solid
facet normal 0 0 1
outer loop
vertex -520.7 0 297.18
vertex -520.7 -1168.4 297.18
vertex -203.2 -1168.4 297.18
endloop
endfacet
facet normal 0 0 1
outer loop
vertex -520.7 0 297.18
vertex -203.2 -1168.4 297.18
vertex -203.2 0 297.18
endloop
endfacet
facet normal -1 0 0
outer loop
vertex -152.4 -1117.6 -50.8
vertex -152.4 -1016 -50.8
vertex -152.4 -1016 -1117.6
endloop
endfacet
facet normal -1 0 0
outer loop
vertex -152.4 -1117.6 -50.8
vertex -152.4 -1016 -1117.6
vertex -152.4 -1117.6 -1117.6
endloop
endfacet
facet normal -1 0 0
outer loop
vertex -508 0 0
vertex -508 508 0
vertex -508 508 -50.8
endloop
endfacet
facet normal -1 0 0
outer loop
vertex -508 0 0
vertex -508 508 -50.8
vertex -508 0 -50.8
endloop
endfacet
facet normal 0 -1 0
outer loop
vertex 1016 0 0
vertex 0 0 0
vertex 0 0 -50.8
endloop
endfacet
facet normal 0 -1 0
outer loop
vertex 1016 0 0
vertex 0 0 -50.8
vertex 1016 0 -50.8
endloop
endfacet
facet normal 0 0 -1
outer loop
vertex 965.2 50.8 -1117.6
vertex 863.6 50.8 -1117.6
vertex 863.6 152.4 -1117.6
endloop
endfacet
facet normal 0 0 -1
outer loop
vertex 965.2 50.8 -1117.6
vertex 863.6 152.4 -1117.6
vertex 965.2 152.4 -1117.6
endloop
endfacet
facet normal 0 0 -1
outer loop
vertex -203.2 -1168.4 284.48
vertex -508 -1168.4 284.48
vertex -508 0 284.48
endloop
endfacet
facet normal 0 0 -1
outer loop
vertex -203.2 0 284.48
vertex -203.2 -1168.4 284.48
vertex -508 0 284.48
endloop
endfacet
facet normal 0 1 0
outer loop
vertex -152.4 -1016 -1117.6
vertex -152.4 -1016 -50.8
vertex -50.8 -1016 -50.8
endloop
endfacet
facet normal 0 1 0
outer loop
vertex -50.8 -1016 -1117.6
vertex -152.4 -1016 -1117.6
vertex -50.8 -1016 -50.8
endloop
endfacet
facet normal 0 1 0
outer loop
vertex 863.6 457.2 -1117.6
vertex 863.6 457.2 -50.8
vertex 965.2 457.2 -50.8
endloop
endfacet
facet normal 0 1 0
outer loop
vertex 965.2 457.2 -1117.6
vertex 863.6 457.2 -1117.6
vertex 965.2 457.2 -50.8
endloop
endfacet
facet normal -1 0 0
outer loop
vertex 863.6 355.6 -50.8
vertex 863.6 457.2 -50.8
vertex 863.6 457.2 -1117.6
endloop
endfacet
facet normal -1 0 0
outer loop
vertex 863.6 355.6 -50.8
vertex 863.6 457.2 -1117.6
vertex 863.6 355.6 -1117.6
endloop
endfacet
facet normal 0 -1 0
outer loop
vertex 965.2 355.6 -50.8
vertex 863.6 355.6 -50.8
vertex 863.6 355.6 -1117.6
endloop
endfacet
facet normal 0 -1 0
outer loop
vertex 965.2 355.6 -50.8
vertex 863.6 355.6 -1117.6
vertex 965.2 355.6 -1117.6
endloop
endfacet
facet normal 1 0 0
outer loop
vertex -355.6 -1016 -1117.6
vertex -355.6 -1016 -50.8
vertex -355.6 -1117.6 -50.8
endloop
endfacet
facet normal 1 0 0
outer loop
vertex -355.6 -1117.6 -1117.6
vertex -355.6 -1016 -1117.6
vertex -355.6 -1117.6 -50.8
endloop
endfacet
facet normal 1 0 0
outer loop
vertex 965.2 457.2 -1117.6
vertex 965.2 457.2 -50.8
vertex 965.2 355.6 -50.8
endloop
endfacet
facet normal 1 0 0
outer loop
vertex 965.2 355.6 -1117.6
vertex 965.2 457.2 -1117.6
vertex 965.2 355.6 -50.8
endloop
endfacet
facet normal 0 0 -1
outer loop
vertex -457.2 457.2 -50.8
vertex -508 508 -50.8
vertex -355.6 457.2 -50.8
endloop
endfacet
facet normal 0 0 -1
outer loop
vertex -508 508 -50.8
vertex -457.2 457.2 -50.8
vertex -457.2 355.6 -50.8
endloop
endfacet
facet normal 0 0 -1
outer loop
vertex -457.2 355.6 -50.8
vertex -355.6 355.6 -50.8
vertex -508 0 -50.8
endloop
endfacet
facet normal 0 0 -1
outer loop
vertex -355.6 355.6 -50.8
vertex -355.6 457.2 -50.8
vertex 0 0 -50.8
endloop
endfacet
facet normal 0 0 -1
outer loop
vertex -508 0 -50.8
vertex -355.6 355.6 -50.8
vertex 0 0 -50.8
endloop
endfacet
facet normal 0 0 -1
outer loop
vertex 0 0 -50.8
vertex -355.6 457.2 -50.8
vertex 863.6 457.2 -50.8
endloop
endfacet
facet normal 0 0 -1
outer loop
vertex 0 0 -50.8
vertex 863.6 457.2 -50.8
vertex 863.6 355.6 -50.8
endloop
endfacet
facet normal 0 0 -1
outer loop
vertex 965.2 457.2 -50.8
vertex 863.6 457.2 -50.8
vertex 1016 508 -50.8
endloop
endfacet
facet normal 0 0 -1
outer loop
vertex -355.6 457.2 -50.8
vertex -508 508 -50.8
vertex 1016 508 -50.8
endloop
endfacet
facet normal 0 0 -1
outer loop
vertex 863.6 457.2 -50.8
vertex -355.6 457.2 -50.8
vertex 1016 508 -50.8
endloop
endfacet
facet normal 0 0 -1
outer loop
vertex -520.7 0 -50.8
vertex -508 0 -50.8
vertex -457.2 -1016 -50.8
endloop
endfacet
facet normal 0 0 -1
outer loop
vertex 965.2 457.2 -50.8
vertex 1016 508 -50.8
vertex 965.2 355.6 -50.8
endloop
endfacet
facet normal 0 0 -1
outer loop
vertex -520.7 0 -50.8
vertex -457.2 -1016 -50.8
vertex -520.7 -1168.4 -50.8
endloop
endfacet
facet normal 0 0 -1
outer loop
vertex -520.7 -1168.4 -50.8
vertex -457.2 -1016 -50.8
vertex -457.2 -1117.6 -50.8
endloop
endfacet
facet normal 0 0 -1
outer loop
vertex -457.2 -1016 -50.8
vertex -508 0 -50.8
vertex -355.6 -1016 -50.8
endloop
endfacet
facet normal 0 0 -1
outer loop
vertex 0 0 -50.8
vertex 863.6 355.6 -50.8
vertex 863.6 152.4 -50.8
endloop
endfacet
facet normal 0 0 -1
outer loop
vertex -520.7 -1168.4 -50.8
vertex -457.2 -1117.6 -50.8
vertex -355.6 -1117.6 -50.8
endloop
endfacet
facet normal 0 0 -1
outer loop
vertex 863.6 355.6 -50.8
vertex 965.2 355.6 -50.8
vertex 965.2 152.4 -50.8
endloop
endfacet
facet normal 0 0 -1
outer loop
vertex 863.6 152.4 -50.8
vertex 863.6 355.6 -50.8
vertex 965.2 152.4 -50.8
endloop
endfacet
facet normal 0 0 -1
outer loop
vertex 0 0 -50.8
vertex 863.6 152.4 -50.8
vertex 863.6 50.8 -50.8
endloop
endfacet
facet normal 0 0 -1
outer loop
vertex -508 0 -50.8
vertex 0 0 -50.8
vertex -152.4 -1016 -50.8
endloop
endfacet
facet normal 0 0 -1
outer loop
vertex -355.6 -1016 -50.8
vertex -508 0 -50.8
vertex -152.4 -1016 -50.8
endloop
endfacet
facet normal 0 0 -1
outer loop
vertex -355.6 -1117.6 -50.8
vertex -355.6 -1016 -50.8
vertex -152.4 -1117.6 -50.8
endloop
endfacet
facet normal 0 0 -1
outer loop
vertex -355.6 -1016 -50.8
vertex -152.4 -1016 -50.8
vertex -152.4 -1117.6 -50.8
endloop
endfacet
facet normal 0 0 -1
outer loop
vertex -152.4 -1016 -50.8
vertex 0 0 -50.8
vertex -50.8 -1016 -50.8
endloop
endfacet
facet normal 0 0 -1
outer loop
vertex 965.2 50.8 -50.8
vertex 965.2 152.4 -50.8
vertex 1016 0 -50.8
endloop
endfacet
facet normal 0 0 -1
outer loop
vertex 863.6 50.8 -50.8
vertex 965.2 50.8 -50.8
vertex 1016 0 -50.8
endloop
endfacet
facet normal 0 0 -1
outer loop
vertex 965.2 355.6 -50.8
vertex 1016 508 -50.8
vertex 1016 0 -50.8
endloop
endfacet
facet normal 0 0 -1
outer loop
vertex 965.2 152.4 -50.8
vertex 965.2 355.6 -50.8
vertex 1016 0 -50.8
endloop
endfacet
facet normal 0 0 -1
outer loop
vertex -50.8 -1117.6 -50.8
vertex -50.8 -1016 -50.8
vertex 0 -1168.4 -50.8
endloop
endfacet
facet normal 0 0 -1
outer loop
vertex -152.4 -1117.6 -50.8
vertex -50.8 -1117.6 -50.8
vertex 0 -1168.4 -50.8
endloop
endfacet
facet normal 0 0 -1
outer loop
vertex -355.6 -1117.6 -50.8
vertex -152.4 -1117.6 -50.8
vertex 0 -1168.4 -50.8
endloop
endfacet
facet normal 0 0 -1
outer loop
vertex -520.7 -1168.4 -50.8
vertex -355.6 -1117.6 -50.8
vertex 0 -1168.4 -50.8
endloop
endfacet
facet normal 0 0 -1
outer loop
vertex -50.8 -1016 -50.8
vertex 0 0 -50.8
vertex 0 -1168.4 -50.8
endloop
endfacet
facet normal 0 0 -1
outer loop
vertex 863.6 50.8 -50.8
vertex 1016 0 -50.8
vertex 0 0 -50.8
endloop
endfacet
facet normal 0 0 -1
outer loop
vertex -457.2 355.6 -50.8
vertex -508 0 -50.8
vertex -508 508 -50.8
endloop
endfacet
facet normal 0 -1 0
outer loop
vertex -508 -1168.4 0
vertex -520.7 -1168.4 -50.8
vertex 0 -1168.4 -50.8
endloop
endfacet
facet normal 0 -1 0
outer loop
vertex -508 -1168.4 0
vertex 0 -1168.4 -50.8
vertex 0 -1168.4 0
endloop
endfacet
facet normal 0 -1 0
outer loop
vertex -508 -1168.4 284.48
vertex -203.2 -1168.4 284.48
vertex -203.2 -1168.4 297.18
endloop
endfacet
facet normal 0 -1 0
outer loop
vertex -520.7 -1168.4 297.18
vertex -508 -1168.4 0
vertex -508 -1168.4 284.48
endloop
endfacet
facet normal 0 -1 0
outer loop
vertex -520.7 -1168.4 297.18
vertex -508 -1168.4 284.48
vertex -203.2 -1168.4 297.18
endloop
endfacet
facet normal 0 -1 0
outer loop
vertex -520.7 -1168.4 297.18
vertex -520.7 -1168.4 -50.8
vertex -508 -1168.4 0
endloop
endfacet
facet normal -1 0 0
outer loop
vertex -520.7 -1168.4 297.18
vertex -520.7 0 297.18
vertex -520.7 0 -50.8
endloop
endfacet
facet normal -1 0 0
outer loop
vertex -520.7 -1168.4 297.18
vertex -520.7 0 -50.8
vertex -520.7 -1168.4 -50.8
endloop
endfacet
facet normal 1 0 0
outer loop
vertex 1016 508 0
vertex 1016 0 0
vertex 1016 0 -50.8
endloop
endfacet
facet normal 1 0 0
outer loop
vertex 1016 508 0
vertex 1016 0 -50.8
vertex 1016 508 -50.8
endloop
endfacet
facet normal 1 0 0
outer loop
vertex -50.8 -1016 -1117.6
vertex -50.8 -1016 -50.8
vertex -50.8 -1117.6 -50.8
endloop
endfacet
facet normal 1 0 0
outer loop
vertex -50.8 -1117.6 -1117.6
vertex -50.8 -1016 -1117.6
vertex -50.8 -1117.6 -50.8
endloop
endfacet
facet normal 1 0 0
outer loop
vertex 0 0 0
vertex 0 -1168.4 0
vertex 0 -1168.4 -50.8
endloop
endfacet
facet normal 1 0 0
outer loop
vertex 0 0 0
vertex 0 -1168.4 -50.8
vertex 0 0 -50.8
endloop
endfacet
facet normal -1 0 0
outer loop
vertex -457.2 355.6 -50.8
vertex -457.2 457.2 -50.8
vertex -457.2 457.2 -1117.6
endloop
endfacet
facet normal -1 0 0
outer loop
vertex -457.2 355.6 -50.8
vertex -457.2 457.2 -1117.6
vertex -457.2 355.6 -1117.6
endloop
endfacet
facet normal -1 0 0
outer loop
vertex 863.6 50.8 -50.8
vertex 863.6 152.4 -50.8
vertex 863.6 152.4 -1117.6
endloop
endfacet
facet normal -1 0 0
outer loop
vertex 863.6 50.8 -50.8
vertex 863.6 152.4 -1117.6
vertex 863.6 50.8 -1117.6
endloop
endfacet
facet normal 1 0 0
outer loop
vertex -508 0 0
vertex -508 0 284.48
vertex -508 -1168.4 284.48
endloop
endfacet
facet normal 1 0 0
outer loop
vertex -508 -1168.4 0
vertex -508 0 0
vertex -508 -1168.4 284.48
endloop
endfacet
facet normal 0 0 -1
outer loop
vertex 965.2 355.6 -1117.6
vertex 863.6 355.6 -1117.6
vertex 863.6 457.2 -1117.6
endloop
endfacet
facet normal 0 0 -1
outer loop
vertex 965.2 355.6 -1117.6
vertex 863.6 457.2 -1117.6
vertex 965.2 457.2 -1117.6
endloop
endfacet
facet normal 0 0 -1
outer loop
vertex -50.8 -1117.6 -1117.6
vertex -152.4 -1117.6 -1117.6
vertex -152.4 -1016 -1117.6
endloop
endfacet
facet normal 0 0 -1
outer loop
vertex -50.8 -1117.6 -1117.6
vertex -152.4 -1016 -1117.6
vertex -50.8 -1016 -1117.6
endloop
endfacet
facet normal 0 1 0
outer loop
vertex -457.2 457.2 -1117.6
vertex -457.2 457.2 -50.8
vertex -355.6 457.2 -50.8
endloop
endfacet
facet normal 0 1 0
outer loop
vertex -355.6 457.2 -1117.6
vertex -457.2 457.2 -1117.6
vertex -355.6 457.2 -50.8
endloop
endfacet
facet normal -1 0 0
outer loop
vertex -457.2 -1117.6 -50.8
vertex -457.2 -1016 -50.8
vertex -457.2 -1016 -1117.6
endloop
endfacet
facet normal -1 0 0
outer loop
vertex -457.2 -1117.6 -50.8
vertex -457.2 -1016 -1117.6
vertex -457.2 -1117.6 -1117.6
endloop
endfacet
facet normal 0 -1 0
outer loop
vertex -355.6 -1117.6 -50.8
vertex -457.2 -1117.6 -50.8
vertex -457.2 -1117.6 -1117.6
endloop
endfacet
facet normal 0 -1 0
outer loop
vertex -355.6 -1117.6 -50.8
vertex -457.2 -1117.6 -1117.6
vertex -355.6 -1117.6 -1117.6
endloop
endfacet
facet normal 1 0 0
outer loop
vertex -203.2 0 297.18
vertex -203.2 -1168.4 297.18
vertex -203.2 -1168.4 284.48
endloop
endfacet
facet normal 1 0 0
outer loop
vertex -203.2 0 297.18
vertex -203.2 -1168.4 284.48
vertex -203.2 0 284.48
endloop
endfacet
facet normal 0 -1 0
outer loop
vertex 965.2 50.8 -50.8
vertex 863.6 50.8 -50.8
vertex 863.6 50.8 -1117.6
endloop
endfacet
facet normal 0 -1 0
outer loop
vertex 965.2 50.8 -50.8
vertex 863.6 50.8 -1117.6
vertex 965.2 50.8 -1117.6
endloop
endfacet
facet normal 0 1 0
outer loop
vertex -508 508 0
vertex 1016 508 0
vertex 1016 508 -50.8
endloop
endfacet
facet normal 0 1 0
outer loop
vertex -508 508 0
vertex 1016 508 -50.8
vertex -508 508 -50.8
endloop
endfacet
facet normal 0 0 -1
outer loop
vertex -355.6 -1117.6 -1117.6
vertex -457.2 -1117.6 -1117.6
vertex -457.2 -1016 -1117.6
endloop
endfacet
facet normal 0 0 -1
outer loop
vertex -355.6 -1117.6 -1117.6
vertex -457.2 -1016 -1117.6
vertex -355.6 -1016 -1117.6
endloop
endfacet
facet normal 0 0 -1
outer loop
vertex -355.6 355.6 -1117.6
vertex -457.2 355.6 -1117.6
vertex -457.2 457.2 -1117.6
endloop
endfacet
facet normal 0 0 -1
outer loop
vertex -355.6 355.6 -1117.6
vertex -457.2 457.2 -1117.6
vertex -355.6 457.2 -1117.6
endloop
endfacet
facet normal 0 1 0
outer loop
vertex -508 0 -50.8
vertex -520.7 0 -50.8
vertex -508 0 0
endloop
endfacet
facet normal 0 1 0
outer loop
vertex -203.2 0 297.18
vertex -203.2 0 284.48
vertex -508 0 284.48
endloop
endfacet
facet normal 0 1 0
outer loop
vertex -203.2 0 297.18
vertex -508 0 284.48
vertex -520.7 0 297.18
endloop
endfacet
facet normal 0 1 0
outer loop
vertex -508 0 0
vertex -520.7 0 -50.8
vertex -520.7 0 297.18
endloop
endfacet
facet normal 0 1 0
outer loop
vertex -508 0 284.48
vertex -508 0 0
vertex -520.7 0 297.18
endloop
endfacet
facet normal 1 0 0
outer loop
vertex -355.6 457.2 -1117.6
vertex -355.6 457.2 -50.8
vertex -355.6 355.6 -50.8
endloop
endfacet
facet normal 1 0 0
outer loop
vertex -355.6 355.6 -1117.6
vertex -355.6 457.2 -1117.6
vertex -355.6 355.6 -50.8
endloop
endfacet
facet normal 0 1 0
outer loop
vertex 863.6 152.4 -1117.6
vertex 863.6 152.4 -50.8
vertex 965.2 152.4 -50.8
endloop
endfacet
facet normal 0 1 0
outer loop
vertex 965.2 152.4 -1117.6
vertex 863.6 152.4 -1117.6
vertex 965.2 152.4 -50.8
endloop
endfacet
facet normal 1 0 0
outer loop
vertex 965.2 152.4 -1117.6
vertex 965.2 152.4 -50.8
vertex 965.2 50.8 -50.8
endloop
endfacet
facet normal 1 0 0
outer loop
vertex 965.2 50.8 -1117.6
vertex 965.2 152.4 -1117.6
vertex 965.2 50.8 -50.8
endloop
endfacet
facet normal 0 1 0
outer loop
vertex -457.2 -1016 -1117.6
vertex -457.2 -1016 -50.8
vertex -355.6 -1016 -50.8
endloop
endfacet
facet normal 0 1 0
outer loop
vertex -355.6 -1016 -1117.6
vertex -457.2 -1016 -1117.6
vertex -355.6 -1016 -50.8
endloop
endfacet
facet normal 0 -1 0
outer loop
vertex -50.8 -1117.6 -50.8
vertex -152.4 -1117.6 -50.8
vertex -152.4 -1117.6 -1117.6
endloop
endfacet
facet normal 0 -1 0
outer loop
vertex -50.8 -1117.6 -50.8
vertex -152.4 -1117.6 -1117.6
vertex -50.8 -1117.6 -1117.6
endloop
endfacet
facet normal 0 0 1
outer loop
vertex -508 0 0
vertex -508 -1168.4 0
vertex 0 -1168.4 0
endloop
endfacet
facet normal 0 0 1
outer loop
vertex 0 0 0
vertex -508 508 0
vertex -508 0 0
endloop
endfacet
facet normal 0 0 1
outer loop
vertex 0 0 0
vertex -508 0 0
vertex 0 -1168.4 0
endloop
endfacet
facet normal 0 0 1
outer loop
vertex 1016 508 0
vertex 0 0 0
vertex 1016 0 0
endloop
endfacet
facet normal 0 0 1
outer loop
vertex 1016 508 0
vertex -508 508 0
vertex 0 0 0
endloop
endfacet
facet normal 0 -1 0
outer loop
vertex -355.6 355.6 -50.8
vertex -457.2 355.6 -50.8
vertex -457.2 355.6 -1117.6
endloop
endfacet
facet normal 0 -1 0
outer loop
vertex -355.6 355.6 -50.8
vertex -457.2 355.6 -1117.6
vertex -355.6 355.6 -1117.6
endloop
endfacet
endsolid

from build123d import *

# Parameters (mm, degrees)
F0_W     = 1016
F0_H     = 508
F1_DEPTH = 50.8
F2_W     = 101.6
F2_H     = 101.6
F3_DEPTH = 1066.8
F4_W     = 1168.4
F4_H     = 297.18
F4_H_2   = 50.8
F5_DEPTH = 12.7
F6_W     = 1168.4
F6_H     = 12.7
F7_DEPTH = 304.8


with BuildPart() as f1:
    # F0 (on Top) → F1 (new body)
    with BuildSketch(Plane.XY):
        Polygon((-508, 508), (-508, -1168.4), (0, -1168.4), (0, 0), (0, 508), align=None)
        with Locations((508, 254)):
            Rectangle(F0_W, F0_H)
    extrude(amount=-F1_DEPTH)

    # F2 (on face) → F3 (join)
    with BuildSketch(Plane(origin=(0, 0, -50.8), x_dir=(1, 0, 0), z_dir=(0, 0, -1))):
        with Locations((-101.6, 1066.8)):
            Rectangle(F2_W, F2_H)
        with Locations((-406.4, 1066.8)):
            Rectangle(F2_W, F2_H)
        with Locations((-406.4, -406.4)):
            Rectangle(F2_W, F2_H)
        with Locations((914.4, -101.6)):
            Rectangle(F2_W, F2_H)
        with Locations((914.4, -406.4)):
            Rectangle(F2_W, F2_H)
    extrude(amount=F3_DEPTH)

    # F4 (on face) → F5 (join)
    with BuildSketch(Plane(origin=(-508, 0, 0), x_dir=(0, -1, 0), z_dir=(-1, 0, 0))):
        with Locations((584.2, 148.59)):
            Rectangle(F4_W, F4_H)
        with Locations((584.2, -25.4)):
            Rectangle(F4_W, F4_H_2)
    extrude(amount=F5_DEPTH)

    # F6 (on face) → F7 (join)
    with BuildSketch(Plane.YZ.offset(-508)):
        with Locations((-584.2, 290.83)):
            Rectangle(F6_W, F6_H)
    extrude(amount=F7_DEPTH)


solid = f1.part
